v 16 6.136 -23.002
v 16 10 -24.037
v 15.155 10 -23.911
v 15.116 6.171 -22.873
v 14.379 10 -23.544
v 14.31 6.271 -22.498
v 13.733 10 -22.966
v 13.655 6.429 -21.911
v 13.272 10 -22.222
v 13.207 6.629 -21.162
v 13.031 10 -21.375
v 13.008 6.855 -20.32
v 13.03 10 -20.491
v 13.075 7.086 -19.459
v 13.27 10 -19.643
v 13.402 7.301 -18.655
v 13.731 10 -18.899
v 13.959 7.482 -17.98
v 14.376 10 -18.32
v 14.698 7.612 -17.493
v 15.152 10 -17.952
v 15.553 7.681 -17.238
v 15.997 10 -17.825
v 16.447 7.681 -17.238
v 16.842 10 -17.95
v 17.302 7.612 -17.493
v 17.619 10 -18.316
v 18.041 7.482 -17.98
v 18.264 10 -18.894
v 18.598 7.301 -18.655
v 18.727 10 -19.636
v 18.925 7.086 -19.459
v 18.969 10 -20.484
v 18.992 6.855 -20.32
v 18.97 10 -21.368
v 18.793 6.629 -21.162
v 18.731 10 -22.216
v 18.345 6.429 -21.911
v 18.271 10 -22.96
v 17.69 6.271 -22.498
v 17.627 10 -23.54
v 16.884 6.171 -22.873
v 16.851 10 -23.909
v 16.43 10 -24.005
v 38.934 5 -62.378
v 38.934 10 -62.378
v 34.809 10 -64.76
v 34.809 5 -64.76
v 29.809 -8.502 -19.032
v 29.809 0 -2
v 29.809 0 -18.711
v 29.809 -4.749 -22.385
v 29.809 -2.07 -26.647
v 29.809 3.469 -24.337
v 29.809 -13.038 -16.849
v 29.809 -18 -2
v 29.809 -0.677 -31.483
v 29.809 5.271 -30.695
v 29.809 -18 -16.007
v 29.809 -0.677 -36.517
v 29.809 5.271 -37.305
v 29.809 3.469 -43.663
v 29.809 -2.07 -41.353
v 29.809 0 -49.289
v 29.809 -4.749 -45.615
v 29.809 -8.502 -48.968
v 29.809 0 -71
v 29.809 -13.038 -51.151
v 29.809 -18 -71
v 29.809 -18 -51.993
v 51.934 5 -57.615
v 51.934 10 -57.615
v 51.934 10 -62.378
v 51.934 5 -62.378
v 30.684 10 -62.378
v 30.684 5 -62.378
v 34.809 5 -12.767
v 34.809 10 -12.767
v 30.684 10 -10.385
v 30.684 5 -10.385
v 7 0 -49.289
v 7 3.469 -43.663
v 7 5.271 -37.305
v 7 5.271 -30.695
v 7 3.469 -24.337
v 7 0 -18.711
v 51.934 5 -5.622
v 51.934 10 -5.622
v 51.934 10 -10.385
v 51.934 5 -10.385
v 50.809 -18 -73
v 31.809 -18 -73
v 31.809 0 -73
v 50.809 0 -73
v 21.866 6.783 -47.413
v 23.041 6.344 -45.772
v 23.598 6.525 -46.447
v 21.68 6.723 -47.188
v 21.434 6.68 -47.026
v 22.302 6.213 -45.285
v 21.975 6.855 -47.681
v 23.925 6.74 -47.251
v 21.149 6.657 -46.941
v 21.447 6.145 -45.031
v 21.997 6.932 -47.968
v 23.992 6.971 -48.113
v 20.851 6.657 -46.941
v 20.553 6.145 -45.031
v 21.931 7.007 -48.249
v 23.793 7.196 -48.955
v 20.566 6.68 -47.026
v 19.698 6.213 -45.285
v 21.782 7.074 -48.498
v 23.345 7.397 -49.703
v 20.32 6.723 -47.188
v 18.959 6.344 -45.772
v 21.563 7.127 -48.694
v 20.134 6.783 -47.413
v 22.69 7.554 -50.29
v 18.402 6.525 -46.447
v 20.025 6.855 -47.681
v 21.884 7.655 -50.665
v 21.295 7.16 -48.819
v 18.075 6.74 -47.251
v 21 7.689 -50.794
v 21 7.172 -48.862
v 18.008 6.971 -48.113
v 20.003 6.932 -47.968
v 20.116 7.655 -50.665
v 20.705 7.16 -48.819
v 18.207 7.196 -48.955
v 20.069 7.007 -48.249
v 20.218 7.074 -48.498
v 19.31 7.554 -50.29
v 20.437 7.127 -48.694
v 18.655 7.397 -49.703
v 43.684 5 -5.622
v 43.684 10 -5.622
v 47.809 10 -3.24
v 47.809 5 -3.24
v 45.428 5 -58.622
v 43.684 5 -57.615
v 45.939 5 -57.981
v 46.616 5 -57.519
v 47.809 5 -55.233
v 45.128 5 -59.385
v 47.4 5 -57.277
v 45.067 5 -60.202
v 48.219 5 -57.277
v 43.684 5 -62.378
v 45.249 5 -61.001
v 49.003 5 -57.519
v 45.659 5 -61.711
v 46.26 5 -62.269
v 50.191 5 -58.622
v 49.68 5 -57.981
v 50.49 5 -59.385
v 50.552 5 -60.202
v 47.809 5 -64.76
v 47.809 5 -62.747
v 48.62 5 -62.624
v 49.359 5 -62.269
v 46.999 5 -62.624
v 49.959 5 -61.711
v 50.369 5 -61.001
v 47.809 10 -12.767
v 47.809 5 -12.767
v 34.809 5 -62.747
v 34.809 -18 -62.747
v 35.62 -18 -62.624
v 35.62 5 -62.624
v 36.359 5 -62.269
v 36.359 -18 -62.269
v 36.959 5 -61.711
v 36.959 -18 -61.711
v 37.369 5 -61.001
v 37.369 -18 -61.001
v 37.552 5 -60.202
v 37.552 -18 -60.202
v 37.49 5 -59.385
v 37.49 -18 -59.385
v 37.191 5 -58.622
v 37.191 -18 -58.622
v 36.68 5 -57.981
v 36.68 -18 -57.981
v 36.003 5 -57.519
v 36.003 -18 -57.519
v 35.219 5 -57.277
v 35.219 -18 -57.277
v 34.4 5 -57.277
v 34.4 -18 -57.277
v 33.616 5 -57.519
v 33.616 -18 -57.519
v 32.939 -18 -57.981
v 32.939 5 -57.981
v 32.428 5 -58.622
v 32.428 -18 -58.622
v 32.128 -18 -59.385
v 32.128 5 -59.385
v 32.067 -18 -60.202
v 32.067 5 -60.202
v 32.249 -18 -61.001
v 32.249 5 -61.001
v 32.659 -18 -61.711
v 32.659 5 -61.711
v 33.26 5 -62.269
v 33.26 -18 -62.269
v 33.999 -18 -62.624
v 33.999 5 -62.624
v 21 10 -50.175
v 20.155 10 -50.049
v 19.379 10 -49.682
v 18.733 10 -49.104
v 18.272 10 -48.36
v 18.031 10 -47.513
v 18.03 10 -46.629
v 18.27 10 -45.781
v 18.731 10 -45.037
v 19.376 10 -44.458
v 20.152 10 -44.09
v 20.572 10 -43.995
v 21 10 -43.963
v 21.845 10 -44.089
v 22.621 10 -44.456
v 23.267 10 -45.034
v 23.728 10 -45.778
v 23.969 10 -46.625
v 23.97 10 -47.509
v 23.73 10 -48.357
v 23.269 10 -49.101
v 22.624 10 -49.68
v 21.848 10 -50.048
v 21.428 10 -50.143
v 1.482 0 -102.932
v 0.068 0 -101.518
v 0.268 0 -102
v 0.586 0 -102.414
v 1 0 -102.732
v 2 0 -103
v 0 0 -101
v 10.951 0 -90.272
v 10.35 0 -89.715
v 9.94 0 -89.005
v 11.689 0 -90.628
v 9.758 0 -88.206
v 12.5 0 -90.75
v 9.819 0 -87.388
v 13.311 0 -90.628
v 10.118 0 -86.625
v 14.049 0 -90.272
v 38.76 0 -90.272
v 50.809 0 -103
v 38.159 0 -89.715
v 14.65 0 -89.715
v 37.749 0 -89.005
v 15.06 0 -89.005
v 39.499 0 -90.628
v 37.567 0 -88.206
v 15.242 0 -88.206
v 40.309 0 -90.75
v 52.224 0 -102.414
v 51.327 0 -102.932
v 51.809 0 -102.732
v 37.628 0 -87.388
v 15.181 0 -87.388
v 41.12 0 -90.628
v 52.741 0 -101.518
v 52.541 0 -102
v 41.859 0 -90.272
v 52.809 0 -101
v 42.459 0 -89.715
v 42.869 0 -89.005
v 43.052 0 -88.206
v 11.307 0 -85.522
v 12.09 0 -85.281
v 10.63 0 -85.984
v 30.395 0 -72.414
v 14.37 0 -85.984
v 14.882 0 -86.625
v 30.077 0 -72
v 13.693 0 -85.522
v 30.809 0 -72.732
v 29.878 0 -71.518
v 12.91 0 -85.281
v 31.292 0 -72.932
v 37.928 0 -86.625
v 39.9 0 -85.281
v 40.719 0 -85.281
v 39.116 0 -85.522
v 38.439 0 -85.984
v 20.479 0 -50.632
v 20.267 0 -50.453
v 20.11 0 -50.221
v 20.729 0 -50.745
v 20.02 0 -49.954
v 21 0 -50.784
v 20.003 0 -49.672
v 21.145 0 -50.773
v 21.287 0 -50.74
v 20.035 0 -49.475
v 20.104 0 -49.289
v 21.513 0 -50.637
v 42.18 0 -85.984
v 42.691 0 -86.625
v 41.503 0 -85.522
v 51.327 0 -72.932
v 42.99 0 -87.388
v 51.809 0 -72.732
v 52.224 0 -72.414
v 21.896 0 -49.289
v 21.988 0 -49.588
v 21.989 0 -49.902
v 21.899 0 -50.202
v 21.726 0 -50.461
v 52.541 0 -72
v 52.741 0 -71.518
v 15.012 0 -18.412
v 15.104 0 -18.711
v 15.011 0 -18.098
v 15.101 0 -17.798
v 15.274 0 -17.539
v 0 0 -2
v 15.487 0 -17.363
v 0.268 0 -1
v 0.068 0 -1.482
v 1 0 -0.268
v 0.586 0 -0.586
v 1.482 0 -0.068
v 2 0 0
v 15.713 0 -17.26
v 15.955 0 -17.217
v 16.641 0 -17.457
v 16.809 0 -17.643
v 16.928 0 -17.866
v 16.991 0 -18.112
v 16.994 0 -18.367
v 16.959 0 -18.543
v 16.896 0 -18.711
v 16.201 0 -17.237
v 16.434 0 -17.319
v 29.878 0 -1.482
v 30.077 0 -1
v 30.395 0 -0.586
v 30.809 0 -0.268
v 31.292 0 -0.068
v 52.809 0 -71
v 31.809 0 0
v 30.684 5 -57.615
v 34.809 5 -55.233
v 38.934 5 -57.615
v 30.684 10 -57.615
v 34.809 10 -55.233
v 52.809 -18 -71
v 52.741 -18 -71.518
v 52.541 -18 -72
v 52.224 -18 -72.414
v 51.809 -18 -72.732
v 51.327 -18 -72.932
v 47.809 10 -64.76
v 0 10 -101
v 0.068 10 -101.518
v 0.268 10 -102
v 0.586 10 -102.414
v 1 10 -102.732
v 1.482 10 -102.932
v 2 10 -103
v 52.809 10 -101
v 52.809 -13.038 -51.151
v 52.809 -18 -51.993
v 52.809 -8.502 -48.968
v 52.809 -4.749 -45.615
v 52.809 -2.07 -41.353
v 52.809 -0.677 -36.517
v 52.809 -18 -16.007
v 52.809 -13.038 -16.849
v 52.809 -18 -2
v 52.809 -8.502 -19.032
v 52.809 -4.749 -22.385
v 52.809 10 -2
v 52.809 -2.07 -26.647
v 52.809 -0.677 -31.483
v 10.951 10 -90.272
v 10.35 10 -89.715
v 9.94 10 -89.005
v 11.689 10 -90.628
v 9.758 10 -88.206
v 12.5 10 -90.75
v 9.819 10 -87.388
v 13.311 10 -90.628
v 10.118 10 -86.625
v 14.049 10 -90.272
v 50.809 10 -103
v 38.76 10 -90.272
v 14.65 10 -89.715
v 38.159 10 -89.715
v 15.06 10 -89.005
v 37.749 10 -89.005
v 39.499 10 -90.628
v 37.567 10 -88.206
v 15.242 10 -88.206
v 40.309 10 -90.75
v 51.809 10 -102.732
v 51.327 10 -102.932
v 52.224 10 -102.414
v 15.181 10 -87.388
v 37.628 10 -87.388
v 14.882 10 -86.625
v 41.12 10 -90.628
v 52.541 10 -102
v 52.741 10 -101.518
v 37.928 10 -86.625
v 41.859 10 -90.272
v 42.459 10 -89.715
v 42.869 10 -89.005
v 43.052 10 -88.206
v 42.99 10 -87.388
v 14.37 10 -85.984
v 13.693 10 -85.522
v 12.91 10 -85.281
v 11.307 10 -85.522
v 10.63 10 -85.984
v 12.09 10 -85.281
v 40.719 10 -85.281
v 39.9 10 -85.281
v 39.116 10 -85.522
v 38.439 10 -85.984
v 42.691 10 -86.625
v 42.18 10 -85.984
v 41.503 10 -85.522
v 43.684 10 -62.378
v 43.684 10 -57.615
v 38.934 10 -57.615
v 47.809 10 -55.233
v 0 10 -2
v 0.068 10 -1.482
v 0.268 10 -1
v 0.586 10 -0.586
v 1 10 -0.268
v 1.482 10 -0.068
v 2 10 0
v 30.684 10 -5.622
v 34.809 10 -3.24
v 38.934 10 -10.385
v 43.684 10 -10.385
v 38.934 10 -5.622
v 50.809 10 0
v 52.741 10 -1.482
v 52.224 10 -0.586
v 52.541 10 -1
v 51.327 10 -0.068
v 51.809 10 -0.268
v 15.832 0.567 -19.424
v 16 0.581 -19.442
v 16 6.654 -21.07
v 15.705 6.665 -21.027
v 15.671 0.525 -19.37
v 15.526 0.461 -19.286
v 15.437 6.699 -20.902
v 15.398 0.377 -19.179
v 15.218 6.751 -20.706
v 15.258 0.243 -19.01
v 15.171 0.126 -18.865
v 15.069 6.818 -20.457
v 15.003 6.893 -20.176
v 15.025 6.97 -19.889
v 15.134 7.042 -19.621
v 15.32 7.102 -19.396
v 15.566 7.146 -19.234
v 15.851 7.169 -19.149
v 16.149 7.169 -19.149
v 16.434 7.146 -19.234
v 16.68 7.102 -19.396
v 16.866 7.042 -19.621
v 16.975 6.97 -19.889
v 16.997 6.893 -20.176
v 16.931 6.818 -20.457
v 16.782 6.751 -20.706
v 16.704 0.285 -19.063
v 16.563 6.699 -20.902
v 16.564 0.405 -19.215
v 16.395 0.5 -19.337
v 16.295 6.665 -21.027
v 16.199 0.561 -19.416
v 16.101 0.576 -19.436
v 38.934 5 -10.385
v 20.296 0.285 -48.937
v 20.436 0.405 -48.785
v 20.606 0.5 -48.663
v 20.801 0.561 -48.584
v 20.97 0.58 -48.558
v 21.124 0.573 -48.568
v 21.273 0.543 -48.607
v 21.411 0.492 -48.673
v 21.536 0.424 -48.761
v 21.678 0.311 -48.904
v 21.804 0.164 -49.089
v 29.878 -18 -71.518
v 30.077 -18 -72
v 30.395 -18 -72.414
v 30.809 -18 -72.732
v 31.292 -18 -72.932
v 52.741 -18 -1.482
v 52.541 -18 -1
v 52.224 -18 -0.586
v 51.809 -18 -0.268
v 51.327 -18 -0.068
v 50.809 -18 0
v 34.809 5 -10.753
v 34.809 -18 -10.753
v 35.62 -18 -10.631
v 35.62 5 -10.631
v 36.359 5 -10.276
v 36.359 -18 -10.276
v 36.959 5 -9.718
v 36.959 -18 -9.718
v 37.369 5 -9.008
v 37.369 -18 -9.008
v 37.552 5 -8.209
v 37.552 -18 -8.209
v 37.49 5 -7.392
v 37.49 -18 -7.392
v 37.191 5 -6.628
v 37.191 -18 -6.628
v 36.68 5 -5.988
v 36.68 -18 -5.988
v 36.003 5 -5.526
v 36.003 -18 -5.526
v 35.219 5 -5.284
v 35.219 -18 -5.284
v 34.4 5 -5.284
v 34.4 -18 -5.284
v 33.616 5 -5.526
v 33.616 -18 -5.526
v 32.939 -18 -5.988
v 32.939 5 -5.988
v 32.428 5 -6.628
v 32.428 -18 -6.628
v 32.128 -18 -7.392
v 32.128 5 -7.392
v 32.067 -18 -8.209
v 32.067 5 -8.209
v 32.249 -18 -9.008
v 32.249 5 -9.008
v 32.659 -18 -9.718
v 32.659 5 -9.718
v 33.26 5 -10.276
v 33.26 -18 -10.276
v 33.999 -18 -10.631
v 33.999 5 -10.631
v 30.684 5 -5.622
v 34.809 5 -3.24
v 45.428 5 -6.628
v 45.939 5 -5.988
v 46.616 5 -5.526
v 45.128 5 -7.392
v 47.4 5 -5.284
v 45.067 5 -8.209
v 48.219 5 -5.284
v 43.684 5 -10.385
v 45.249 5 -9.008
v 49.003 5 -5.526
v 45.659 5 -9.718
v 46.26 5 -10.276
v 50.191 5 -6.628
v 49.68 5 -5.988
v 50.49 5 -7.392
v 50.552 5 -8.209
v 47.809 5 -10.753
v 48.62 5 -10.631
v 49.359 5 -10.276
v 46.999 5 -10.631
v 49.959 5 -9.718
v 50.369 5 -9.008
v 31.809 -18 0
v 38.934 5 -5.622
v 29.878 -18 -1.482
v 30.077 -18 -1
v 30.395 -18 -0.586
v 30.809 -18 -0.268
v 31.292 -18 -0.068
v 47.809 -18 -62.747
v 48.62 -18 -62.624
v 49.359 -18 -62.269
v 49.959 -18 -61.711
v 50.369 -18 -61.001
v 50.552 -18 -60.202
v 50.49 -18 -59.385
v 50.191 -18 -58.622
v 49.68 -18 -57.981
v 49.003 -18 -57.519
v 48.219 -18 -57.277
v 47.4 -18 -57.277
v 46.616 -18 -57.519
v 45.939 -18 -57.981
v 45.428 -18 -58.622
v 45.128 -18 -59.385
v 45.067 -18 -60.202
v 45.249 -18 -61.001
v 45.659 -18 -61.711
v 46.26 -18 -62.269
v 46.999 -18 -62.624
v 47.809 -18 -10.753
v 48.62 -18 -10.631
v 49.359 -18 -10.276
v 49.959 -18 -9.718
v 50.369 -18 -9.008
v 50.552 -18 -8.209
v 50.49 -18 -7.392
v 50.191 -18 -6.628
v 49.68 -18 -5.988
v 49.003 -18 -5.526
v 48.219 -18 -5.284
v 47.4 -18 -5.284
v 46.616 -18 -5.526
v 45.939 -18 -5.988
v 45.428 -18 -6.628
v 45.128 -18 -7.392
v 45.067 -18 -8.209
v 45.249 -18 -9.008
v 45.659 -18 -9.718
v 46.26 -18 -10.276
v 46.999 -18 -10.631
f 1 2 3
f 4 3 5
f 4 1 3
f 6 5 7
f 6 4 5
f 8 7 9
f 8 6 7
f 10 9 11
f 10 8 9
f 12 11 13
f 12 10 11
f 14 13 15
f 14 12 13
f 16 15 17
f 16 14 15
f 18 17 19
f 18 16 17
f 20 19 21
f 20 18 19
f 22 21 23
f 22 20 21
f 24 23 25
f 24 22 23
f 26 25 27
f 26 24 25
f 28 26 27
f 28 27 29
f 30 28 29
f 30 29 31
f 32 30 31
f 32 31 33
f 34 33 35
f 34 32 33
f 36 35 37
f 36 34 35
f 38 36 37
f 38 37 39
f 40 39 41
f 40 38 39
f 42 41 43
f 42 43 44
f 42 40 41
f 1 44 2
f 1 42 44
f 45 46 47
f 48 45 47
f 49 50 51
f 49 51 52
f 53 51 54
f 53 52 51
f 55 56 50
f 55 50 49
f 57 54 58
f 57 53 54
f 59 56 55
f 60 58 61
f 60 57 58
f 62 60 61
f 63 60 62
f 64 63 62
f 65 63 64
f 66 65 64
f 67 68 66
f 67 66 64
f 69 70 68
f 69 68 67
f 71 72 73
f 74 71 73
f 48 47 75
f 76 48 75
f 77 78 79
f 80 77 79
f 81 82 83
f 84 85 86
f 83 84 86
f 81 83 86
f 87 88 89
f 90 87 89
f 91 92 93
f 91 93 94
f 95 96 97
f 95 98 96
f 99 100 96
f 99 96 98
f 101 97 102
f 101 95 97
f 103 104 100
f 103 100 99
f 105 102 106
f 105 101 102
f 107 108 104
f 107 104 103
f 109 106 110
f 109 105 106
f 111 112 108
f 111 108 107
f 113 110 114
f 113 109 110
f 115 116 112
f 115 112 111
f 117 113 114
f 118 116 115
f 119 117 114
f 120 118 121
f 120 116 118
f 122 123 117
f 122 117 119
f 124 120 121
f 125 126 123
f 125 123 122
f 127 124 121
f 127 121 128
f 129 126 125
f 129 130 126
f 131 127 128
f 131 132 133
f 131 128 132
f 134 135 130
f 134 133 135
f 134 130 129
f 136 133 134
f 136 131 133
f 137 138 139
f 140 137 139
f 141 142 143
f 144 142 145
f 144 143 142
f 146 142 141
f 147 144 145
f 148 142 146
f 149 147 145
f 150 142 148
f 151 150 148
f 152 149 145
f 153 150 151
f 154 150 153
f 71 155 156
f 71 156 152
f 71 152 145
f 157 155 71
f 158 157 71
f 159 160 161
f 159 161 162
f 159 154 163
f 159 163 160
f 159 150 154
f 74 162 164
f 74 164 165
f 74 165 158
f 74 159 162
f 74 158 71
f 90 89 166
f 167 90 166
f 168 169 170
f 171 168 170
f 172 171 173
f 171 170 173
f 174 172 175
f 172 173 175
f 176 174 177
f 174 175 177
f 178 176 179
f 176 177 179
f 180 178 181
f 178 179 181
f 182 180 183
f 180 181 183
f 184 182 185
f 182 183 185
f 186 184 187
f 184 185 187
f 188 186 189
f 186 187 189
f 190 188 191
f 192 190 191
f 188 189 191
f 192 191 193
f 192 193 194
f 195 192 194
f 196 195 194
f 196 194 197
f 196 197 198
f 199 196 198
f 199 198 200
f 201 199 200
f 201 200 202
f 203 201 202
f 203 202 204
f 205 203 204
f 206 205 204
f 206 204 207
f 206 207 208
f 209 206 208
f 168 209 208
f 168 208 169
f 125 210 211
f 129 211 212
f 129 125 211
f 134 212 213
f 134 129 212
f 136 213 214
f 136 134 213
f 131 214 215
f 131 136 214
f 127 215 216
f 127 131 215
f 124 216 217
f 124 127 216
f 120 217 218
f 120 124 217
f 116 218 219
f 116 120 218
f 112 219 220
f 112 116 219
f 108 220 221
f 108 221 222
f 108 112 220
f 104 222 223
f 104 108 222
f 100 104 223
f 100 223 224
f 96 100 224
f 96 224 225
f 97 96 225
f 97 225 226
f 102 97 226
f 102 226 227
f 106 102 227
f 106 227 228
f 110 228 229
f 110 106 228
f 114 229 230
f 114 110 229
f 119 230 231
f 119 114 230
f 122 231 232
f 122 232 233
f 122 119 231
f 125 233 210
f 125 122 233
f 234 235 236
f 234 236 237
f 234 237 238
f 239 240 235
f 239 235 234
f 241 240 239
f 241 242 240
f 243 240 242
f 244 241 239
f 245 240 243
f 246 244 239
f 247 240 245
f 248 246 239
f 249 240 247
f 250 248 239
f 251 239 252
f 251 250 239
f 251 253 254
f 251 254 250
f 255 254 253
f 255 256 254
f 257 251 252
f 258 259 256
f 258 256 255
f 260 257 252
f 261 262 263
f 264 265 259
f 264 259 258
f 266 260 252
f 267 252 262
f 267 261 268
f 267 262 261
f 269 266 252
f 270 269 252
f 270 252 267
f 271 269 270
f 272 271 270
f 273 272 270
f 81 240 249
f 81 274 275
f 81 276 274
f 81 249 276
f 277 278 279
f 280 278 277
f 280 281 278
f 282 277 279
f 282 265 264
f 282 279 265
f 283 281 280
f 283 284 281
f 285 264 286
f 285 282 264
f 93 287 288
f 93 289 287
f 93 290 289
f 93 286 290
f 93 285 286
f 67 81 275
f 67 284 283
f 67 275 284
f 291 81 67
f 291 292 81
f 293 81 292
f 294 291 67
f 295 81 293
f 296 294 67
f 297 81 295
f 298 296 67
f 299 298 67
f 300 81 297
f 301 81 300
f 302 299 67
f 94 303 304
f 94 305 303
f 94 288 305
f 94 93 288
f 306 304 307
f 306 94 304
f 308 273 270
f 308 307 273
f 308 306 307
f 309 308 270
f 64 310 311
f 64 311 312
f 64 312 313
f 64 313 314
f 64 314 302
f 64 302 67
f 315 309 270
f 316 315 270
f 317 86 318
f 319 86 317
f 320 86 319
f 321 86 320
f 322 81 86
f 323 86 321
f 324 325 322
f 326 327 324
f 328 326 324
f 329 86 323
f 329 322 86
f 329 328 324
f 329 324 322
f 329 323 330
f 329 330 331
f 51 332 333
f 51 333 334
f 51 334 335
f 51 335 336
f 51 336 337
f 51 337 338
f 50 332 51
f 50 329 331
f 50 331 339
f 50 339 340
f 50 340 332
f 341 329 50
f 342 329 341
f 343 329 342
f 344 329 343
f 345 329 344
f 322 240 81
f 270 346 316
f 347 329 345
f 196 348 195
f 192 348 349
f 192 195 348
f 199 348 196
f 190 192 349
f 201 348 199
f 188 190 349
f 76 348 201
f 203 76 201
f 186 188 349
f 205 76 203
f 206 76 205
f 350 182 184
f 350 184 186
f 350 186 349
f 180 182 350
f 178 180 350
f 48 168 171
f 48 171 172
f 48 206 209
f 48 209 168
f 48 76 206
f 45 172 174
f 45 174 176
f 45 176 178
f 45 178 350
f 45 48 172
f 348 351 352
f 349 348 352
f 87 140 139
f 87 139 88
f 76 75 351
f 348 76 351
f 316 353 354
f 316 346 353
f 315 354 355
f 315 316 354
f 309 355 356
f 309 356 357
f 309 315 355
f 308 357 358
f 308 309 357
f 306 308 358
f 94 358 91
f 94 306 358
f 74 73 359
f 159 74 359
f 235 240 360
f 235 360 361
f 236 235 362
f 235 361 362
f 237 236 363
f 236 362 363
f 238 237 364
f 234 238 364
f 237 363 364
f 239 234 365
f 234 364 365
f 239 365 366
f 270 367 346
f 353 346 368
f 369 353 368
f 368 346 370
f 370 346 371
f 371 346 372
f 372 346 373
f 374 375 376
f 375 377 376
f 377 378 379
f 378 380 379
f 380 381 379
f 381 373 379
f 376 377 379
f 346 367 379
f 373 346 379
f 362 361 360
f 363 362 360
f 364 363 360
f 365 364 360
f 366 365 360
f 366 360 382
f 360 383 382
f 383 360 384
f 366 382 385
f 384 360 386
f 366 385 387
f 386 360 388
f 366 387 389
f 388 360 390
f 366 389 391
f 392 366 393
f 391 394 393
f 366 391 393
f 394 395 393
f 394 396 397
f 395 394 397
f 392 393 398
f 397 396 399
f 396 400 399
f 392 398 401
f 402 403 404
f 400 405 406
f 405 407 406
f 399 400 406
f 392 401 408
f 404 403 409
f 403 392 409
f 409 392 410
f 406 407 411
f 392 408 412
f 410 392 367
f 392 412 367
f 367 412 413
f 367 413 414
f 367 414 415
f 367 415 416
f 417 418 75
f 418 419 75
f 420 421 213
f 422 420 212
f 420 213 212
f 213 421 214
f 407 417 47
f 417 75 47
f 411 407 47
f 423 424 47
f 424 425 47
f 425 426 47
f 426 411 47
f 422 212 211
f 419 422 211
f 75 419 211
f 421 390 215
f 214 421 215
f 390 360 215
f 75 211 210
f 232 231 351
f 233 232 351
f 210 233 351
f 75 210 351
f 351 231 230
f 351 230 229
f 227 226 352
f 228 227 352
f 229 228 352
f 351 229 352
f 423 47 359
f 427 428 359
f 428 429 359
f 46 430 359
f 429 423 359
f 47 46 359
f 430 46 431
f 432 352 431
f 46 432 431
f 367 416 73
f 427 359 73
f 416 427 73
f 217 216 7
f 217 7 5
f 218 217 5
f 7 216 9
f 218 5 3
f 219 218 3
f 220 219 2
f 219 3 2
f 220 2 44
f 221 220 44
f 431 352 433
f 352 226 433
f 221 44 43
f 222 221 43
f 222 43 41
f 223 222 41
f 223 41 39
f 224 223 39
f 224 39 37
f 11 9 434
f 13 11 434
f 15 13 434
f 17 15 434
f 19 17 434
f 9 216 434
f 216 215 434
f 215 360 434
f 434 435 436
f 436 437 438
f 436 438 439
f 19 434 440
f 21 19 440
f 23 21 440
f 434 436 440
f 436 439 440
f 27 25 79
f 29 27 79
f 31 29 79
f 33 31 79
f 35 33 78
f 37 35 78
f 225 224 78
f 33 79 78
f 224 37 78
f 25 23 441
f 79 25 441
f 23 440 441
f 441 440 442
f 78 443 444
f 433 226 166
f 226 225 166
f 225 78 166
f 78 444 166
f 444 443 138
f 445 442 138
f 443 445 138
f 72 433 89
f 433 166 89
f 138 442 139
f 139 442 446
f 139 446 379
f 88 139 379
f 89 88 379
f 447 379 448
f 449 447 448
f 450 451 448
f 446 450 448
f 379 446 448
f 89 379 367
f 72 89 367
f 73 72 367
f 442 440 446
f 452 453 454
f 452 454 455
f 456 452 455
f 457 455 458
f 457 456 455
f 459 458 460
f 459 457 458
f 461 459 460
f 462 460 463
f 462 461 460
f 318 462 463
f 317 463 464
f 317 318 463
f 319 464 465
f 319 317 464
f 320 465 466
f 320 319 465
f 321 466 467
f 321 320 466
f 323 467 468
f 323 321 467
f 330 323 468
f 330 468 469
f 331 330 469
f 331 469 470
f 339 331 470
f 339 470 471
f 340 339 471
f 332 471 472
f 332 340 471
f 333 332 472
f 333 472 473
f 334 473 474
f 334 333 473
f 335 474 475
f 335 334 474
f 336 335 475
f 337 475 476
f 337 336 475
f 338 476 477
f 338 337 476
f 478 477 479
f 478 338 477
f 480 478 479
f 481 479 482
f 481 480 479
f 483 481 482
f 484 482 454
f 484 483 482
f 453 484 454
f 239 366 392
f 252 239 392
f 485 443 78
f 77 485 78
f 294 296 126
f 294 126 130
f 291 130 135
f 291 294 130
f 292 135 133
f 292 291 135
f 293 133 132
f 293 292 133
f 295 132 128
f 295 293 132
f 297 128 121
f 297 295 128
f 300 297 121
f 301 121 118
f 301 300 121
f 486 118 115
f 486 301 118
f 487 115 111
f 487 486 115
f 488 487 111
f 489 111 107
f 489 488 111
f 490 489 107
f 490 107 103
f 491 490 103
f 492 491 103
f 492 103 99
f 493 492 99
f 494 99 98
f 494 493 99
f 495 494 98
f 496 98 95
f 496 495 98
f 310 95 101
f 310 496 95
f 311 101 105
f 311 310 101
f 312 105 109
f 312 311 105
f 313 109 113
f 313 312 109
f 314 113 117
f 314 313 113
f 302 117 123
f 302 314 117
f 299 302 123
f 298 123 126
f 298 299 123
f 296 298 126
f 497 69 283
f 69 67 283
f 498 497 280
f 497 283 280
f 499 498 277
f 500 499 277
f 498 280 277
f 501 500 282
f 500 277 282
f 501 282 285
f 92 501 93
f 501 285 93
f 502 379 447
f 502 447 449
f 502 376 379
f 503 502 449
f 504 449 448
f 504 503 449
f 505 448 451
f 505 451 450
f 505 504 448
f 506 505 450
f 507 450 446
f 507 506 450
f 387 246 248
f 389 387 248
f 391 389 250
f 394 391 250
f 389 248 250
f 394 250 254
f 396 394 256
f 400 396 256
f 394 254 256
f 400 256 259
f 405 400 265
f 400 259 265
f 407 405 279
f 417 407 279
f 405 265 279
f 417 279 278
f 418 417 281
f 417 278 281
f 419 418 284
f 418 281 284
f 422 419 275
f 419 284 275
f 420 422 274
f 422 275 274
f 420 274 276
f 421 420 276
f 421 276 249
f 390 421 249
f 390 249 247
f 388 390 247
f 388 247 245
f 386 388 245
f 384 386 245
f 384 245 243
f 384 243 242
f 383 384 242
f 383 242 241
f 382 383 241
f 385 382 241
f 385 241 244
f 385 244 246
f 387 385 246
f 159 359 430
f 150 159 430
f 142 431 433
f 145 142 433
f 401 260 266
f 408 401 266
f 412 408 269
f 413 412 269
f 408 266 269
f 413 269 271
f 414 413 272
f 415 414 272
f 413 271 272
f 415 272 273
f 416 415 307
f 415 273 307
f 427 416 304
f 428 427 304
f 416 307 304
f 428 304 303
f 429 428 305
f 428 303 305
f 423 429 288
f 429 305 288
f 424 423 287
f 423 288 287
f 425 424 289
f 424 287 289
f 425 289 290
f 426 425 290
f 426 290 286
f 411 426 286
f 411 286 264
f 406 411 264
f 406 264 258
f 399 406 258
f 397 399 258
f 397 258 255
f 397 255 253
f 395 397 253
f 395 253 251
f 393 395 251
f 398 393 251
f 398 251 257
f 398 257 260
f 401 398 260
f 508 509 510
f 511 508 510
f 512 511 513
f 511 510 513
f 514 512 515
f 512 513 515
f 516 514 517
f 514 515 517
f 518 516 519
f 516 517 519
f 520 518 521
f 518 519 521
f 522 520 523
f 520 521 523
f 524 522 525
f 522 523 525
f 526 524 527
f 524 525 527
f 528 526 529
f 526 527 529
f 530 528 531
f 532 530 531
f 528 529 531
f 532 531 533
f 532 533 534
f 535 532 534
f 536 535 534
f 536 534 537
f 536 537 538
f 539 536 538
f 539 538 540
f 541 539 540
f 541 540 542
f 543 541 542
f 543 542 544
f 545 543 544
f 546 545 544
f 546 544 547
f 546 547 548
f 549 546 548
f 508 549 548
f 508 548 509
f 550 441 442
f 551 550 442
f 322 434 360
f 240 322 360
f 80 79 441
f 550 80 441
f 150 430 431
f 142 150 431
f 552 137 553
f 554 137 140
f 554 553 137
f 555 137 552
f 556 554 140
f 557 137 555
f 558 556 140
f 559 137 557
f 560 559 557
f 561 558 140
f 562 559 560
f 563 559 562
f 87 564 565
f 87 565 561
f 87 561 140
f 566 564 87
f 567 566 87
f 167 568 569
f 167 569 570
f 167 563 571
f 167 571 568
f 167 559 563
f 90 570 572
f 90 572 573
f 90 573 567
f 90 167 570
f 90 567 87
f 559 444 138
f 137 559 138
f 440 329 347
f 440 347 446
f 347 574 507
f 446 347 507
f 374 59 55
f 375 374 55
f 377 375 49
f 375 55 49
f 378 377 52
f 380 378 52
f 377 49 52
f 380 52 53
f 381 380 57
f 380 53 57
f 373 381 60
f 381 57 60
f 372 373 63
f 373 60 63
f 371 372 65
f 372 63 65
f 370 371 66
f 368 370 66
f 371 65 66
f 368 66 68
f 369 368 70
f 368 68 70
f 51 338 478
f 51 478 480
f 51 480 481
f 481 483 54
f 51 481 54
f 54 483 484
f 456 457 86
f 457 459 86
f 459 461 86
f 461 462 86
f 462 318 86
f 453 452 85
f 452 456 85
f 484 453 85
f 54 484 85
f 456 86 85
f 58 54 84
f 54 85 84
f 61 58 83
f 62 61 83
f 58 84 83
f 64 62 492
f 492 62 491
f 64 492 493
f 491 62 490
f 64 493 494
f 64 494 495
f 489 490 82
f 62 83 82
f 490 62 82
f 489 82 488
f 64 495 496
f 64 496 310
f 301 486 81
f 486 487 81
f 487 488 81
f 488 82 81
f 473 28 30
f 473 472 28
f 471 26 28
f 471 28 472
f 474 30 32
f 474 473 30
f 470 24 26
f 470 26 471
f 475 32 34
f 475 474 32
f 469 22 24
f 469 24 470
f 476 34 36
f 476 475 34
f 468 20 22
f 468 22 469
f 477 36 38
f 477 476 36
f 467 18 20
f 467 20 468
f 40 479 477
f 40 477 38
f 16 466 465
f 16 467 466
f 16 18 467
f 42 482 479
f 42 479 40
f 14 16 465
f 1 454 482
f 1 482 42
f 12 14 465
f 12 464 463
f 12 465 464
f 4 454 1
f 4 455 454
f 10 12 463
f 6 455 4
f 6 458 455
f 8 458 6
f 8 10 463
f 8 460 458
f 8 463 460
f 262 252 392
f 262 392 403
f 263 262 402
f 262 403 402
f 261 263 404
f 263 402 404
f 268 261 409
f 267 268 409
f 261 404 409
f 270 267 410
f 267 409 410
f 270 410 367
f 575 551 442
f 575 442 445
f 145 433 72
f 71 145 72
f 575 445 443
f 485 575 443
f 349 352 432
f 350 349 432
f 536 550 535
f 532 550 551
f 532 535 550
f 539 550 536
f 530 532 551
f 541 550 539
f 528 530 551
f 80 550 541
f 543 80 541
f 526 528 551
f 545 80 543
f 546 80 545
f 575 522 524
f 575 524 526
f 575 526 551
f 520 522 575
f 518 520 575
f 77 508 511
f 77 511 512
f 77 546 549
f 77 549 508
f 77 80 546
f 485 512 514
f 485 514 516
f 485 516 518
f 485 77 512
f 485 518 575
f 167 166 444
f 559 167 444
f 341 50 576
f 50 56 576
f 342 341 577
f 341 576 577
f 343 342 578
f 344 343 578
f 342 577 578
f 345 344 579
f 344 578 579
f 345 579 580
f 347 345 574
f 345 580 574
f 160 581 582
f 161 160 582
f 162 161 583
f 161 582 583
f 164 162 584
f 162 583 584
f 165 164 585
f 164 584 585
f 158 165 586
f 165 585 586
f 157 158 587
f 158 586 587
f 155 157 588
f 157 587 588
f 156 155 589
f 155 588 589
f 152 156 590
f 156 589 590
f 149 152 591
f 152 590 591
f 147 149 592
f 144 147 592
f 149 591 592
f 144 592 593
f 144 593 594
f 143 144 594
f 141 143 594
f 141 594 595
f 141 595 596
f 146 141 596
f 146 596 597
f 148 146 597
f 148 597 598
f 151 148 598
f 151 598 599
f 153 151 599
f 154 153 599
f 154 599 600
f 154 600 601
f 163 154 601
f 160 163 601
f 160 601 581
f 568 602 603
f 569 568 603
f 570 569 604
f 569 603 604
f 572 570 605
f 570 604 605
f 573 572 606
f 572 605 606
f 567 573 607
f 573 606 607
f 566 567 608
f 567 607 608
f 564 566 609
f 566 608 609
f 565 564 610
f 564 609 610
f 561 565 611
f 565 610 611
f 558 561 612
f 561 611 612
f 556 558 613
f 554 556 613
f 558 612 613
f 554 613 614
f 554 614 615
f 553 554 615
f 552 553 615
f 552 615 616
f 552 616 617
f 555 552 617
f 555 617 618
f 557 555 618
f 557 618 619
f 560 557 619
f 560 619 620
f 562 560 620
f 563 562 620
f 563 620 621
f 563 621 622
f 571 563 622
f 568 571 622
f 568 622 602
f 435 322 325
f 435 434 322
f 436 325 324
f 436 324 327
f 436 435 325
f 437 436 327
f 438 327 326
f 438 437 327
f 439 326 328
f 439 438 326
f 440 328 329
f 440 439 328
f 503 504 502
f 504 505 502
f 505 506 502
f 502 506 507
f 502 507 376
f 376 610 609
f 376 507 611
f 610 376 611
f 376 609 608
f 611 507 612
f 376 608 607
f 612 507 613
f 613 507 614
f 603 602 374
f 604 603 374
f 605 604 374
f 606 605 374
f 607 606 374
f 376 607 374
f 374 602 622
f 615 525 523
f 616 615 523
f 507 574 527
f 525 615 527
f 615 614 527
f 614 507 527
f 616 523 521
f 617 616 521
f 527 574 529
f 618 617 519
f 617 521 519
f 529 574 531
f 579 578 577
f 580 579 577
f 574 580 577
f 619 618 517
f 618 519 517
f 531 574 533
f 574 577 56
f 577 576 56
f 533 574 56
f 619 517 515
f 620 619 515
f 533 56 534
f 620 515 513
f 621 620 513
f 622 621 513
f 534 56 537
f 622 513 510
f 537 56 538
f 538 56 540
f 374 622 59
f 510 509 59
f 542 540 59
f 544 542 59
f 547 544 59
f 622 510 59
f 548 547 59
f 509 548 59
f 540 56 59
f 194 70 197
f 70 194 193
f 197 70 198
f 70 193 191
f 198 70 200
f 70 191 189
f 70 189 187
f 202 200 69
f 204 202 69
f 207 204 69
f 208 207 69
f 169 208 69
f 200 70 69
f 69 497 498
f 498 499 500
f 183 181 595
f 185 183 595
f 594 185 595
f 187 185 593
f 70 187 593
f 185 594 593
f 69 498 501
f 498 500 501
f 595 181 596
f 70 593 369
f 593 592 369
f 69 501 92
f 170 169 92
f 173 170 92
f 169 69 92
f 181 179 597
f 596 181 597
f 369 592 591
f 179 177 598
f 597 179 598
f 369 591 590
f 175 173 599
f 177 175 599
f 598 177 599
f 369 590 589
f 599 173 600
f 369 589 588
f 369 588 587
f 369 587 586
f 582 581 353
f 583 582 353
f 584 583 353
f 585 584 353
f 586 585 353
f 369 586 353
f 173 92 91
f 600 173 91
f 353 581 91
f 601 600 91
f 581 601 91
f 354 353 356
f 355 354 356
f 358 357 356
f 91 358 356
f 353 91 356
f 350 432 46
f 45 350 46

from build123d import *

# Parameters (mm, degrees)
SKETCH1_W                       = 52.809375
SKETCH1_H                       = 85
BOSS_EXTRUDE1_DEPTH             = 10
SPRING_PULLEY_CUTOUT_DEPTH      = 10
SPRING_PULLEY_CUTOUT_DEPTH_BACK = 11
SKETCH2_R                       = 24
BOSS_EXTRUDE4_DEPTH             = 23
SKETCH20_R                      = 2.75
CUT_EXTRUDE8_DEPTH              = 104.912607935
MOVE_START                      = -18
MOVE_FACE1_OUTLINE_W            = 23
MOVE_FACE1_OUTLINE_H            = 5
MOVE_FACE1_DEPTH                = 18
MOVE_FACE3_BY                   = 1
MOVE_FACE4_BY                   = 0.809375
FILLET4_R                       = 2
BOSS_EXTRUDE5_START             = -10
BOSS_EXTRUDE5_DEPTH             = 10
SKETCH38_R                      = 2.75
CUT_EXTRUDE9_DEPTH              = 118.140215502
CUT_EXTRUDE10_DEPTH             = 5


# Read off the part's stored shape, not the designer's step: Move Face1
with BuildPart() as part:
    # Sketch1 → Boss-Extrude1 (new body)
    with BuildSketch(Plane(origin=(0, 0, 0), x_dir=(1, 0, 0), z_dir=(0, 1, 0))):
        with Locations((26.4046875, 42.5)):
            Rectangle(SKETCH1_W, SKETCH1_H)
    extrude(amount=BOSS_EXTRUDE1_DEPTH)

    # Sketch2 → spring_pulley_cutout (cut, two sides: drawn at the far end of the back side and taken through both)
    with BuildSketch(Plane.ZY.offset(-18).offset(-SPRING_PULLEY_CUTOUT_DEPTH_BACK)):
        with Locations((-34, -18.5)):
            Circle(SKETCH2_R)
    extrude(amount=SPRING_PULLEY_CUTOUT_DEPTH + SPRING_PULLEY_CUTOUT_DEPTH_BACK, mode=Mode.SUBTRACT)

    # Sketch34 → Cut-Revolve1 (revolve, cut)
    with BuildSketch(Plane(origin=(16, 0, 0), x_dir=(0, 0, -1), z_dir=(1, 0, 0))):
        Polygon((16.798424815, -5.423086457), (21.139079438, 10.776457135), (24.036856917, 10), (23.001580737, 6.136296695), (21.069729084, 6.653934785), (17.764350642, -5.681905502), align=None)
    revolve(axis=Axis((16, -5.423086457, -16.798424815), (0, 0.9659258262890682, -0.2588190451025213)), mode=Mode.SUBTRACT)

    # Sketch36 → Cut-Revolve2 (revolve, cut)
    with BuildSketch(Plane(origin=(21, 0, 0), x_dir=(0, 0, -1), z_dir=(1, 0, 0)), mode=Mode.PRIVATE) as cut_revolve2_sk:
        Polygon((50.543888978, -2.968568117), (46.860920562, 10.776457135), (43.963143083, 10), (44.998419263, 6.136296695), (46.930270916, 6.653934785), (49.577963152, -3.227387162), align=None)
    revolve(cut_revolve2_sk.sketch.rotate(Axis((21, -2.968568117, -50.543888978), (0, 0.9659258262890665, 0.2588190451025275)), 180), axis=Axis((21, -2.968568117, -50.543888978), (0, 0.9659258262890665, 0.2588190451025275)), mode=Mode.SUBTRACT)

    # Sketch19 → Boss-Extrude4 (add)
    with BuildSketch(Plane.ZY.offset(-29.809375)):
        with BuildLine():
            Line((-68, -18), (-68, 0))
            Line((-68, 0), (0, 0))
            Line((0, 0), (0, -18))
            Line((0, -18), (-16.006945785, -18))
            ThreePointArc((-16.006945785, -18), (-34, -0.5), (-51.993054215, -18))
            Line((-51.993054215, -18), (-68, -18))
        make_face()
    extrude(amount=-BOSS_EXTRUDE4_DEPTH)

    # Sketch20 → Cut-Extrude8 (cut, through all)
    with BuildSketch(Plane(origin=(0, -18, 0), x_dir=(-1, 0, 0), z_dir=(0, -1, 0))):
        with Locations(Location((-47.809375, 8.003472892, 0), (0, 0, 90))):
            Circle(SKETCH20_R)
        with Locations(Location((-34.809375, 8.003472892, 0), (0, 0, 90))):
            Circle(SKETCH20_R)
        with Locations(Location((-47.809375, 59.996527108, 0), (0, 0, 90))):
            Circle(SKETCH20_R)
        with Locations(Location((-34.809375, 59.996527108, 0), (0, 0, 90))):
            Circle(SKETCH20_R)
    extrude(amount=-CUT_EXTRUDE8_DEPTH, mode=Mode.SUBTRACT)

    # Move Face1 outline → Move Face1 (add)
    with BuildSketch(Plane(origin=(0, 0, 0), x_dir=(1, 0, 0), z_dir=(0, 1, 0)).offset(MOVE_START)):
        with Locations((41.309375, 70.5)):
            Rectangle(MOVE_FACE1_OUTLINE_W, MOVE_FACE1_OUTLINE_H)
    extrude(amount=MOVE_FACE1_DEPTH)

    # Move Face3: a face moved inward by 1.0
    extrude(part.faces().sort_by_distance((8, 2.223147927, -34))[0], amount=MOVE_FACE3_BY, dir=(-1, 0, 0), mode=Mode.SUBTRACT)

    # Move Face4: a face moved inward by 0.809375
    extrude(part.faces().sort_by_distance((29, 2.223147927, -34))[0], amount=MOVE_FACE4_BY, dir=(1, 0, 0), mode=Mode.SUBTRACT)

    # Fillet4
    fillet4_edges = [part.edges().sort_by_distance(p)[0] for p in [
        (52.809375, -9, -73),
        (29.809375, -9, 0),
        (29.809375, -9, -73),
        (0, 5, -85),
        (52.809375, 5, -85),
        (52.809375, -4, 0),
        (0, 5, 0),
    ]]
    fillet(fillet4_edges, radius=FILLET4_R)

    # Sketch37 → Boss-Extrude5 (add)
    with BuildSketch(Plane.XZ.offset(BOSS_EXTRUDE5_START)):
        with BuildLine():
            Line((0, -83), (0, -101))
            ThreePointArc((0, -101), (0.585786438, -102.414213562), (2, -103))
            Line((2, -103), (50.809375, -103))
            ThreePointArc((50.809375, -103), (52.223588562, -102.414213562), (52.809375, -101))
            Line((52.809375, -101), (52.809375, -83))
            ThreePointArc((52.809375, -83), (52.223588562, -84.414213562), (50.809375, -85))
            Line((50.809375, -85), (2, -85))
            ThreePointArc((2, -85), (0.585786438, -84.414213562), (0, -83))
        make_face()
    extrude(amount=BOSS_EXTRUDE5_DEPTH)

    # Sketch38 → Cut-Extrude9 (cut, through all)
    with BuildSketch(Plane.XZ):
        with Locations(Location((12.5, -88, 0), (0, 0, 270))):
            Circle(SKETCH38_R)
        with Locations(Location((40.309375, -88, 0), (0, 0, 270))):
            Circle(SKETCH38_R)
    extrude(amount=-CUT_EXTRUDE9_DEPTH, mode=Mode.SUBTRACT)

    # Sketch39 → Cut-Extrude10 (cut)
    with BuildSketch(Plane(origin=(0, 10, 0), x_dir=(1, 0, 0), z_dir=(0, 1, 0))):
        Polygon((47.809375, 64.759666829), (43.684375, 62.378096968), (43.684375, 57.614957247), (47.809375, 55.233387387), (51.934375, 57.614957247), (51.934375, 62.378096968), align=None)
        Polygon((34.809375, 64.759666829), (30.684375, 62.378096968), (30.684375, 57.614957247), (34.809375, 55.233387387), (38.934375, 57.614957247), (38.934375, 62.378096968), align=None)
        Polygon((34.809375, 12.766612613), (30.684375, 10.385042753), (30.684375, 5.621903032), (34.809375, 3.240333171), (38.934375, 5.621903032), (38.934375, 10.385042753), align=None)
        Polygon((47.809375, 12.766612613), (43.684375, 10.385042753), (43.684375, 5.621903032), (47.809375, 3.240333171), (51.934375, 5.621903032), (51.934375, 10.385042753), align=None)
    extrude(amount=-CUT_EXTRUDE10_DEPTH, mode=Mode.SUBTRACT)


solid = part.part
